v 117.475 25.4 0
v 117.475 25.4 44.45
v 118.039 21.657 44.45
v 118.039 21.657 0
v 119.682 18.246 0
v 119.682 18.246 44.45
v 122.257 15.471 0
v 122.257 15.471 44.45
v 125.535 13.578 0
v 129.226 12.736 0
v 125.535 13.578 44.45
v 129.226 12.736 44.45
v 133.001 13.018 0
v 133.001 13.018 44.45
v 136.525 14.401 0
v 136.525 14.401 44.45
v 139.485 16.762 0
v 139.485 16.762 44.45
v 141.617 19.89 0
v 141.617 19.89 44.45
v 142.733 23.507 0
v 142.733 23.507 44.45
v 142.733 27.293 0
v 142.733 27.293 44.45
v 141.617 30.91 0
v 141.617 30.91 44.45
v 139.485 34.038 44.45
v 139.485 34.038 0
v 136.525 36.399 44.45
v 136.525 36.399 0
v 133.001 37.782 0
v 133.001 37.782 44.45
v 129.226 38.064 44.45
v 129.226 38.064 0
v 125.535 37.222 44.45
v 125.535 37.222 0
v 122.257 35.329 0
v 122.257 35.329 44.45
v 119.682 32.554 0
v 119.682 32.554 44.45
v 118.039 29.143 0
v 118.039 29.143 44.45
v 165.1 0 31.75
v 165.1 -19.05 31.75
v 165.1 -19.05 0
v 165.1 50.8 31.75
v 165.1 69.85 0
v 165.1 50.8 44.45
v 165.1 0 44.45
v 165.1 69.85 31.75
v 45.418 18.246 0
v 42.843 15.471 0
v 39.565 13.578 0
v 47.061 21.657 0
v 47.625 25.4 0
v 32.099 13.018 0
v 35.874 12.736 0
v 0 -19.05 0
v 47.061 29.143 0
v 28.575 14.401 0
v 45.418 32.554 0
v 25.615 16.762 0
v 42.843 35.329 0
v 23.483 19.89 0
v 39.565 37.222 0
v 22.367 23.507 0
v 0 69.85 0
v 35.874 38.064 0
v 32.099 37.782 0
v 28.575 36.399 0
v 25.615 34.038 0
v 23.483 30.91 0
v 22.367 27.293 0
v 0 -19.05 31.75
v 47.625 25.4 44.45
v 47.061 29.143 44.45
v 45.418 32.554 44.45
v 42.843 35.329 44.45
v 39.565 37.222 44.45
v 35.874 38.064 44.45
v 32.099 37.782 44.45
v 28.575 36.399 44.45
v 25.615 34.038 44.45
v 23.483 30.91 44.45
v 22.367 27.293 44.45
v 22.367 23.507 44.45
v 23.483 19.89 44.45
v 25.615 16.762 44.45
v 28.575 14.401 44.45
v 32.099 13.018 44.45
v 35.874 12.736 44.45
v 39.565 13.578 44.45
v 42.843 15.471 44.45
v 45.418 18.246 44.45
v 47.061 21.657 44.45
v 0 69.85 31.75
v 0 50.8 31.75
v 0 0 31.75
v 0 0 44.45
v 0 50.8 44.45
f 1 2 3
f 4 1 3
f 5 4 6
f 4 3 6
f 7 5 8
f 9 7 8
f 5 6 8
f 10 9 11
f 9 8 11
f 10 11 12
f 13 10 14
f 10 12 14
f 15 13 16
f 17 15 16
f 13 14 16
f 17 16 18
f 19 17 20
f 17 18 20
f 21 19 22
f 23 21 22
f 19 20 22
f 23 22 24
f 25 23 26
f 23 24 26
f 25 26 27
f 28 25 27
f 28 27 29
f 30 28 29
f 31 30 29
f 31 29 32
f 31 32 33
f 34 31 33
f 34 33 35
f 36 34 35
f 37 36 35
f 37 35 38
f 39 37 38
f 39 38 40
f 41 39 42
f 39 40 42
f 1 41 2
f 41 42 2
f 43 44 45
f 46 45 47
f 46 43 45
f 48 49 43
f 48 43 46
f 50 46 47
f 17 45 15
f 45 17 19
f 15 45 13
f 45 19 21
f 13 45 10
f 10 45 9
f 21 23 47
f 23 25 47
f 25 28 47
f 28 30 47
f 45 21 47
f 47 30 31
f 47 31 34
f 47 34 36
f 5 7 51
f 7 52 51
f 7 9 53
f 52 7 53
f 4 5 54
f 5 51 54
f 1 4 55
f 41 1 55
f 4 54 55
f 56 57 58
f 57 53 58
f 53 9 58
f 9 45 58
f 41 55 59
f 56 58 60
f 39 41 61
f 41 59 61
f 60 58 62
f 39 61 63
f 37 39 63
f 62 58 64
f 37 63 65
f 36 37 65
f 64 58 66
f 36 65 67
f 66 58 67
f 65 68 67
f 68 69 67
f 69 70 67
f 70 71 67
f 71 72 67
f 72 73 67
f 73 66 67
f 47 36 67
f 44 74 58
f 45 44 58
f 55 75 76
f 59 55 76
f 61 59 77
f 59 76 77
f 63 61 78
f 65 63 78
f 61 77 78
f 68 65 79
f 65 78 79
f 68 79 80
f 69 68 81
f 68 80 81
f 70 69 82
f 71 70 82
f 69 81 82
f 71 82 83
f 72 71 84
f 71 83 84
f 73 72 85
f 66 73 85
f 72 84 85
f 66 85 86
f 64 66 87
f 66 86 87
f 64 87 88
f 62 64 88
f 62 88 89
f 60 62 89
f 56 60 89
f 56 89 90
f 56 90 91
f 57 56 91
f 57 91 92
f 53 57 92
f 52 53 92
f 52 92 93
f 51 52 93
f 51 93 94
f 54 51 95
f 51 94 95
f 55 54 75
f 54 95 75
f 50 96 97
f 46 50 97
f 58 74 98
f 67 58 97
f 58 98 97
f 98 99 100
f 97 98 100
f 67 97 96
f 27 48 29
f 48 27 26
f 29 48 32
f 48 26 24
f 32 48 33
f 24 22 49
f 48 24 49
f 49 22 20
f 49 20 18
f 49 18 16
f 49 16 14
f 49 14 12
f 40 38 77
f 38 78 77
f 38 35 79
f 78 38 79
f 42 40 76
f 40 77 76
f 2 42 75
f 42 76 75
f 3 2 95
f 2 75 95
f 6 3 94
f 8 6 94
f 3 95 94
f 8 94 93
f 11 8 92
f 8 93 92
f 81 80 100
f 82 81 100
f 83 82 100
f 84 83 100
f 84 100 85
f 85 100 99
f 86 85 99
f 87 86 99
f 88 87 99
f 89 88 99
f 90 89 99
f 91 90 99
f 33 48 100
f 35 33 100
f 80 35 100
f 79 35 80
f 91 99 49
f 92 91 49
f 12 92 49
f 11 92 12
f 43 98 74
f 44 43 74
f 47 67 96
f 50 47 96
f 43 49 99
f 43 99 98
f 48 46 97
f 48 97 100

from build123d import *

# Parameters (mm, degrees)
F1_DEPTH = 165.1
F3_DEPTH = 44.45


with BuildPart() as f1:
    # F0 (on Right) → F1 (new body)
    with BuildSketch(Plane.YZ):
        Polygon((-19.05, 0), (0, 0), (69.85, 0), (69.85, 31.75), (50.8, 31.75), (50.8, 44.45), (0, 44.45), (0, 31.75), (-19.05, 31.75), align=None)
    extrude(amount=F1_DEPTH)

    # F2 (on face) → F3 (cut, through all)
    with BuildSketch(Plane.XY.offset(44.45)):
        with BuildLine():
            Line((34.925, 25.4), (22.225, 25.4))
            ThreePointArc((22.225, 25.4), (34.925, 12.7), (47.625, 25.4))
            Line((47.625, 25.4), (34.925, 25.4))
        make_face()
        with BuildLine():
            ThreePointArc((142.875, 25.4), (130.175, 38.1), (117.475, 25.4))
            Line((117.475, 25.4), (130.175, 25.4))
            Line((130.175, 25.4), (142.875, 25.4))
        make_face()
        with BuildLine():
            Line((130.175, 25.4), (117.475, 25.4))
            ThreePointArc((117.475, 25.4), (130.175, 12.7), (142.875, 25.4))
            Line((142.875, 25.4), (130.175, 25.4))
        make_face()
        with BuildLine():
            ThreePointArc((47.625, 25.4), (34.925, 38.1), (22.225, 25.4))
            Line((22.225, 25.4), (34.925, 25.4))
            Line((34.925, 25.4), (47.625, 25.4))
        make_face()
    extrude(amount=-F3_DEPTH, mode=Mode.SUBTRACT)


solid = f1.part
